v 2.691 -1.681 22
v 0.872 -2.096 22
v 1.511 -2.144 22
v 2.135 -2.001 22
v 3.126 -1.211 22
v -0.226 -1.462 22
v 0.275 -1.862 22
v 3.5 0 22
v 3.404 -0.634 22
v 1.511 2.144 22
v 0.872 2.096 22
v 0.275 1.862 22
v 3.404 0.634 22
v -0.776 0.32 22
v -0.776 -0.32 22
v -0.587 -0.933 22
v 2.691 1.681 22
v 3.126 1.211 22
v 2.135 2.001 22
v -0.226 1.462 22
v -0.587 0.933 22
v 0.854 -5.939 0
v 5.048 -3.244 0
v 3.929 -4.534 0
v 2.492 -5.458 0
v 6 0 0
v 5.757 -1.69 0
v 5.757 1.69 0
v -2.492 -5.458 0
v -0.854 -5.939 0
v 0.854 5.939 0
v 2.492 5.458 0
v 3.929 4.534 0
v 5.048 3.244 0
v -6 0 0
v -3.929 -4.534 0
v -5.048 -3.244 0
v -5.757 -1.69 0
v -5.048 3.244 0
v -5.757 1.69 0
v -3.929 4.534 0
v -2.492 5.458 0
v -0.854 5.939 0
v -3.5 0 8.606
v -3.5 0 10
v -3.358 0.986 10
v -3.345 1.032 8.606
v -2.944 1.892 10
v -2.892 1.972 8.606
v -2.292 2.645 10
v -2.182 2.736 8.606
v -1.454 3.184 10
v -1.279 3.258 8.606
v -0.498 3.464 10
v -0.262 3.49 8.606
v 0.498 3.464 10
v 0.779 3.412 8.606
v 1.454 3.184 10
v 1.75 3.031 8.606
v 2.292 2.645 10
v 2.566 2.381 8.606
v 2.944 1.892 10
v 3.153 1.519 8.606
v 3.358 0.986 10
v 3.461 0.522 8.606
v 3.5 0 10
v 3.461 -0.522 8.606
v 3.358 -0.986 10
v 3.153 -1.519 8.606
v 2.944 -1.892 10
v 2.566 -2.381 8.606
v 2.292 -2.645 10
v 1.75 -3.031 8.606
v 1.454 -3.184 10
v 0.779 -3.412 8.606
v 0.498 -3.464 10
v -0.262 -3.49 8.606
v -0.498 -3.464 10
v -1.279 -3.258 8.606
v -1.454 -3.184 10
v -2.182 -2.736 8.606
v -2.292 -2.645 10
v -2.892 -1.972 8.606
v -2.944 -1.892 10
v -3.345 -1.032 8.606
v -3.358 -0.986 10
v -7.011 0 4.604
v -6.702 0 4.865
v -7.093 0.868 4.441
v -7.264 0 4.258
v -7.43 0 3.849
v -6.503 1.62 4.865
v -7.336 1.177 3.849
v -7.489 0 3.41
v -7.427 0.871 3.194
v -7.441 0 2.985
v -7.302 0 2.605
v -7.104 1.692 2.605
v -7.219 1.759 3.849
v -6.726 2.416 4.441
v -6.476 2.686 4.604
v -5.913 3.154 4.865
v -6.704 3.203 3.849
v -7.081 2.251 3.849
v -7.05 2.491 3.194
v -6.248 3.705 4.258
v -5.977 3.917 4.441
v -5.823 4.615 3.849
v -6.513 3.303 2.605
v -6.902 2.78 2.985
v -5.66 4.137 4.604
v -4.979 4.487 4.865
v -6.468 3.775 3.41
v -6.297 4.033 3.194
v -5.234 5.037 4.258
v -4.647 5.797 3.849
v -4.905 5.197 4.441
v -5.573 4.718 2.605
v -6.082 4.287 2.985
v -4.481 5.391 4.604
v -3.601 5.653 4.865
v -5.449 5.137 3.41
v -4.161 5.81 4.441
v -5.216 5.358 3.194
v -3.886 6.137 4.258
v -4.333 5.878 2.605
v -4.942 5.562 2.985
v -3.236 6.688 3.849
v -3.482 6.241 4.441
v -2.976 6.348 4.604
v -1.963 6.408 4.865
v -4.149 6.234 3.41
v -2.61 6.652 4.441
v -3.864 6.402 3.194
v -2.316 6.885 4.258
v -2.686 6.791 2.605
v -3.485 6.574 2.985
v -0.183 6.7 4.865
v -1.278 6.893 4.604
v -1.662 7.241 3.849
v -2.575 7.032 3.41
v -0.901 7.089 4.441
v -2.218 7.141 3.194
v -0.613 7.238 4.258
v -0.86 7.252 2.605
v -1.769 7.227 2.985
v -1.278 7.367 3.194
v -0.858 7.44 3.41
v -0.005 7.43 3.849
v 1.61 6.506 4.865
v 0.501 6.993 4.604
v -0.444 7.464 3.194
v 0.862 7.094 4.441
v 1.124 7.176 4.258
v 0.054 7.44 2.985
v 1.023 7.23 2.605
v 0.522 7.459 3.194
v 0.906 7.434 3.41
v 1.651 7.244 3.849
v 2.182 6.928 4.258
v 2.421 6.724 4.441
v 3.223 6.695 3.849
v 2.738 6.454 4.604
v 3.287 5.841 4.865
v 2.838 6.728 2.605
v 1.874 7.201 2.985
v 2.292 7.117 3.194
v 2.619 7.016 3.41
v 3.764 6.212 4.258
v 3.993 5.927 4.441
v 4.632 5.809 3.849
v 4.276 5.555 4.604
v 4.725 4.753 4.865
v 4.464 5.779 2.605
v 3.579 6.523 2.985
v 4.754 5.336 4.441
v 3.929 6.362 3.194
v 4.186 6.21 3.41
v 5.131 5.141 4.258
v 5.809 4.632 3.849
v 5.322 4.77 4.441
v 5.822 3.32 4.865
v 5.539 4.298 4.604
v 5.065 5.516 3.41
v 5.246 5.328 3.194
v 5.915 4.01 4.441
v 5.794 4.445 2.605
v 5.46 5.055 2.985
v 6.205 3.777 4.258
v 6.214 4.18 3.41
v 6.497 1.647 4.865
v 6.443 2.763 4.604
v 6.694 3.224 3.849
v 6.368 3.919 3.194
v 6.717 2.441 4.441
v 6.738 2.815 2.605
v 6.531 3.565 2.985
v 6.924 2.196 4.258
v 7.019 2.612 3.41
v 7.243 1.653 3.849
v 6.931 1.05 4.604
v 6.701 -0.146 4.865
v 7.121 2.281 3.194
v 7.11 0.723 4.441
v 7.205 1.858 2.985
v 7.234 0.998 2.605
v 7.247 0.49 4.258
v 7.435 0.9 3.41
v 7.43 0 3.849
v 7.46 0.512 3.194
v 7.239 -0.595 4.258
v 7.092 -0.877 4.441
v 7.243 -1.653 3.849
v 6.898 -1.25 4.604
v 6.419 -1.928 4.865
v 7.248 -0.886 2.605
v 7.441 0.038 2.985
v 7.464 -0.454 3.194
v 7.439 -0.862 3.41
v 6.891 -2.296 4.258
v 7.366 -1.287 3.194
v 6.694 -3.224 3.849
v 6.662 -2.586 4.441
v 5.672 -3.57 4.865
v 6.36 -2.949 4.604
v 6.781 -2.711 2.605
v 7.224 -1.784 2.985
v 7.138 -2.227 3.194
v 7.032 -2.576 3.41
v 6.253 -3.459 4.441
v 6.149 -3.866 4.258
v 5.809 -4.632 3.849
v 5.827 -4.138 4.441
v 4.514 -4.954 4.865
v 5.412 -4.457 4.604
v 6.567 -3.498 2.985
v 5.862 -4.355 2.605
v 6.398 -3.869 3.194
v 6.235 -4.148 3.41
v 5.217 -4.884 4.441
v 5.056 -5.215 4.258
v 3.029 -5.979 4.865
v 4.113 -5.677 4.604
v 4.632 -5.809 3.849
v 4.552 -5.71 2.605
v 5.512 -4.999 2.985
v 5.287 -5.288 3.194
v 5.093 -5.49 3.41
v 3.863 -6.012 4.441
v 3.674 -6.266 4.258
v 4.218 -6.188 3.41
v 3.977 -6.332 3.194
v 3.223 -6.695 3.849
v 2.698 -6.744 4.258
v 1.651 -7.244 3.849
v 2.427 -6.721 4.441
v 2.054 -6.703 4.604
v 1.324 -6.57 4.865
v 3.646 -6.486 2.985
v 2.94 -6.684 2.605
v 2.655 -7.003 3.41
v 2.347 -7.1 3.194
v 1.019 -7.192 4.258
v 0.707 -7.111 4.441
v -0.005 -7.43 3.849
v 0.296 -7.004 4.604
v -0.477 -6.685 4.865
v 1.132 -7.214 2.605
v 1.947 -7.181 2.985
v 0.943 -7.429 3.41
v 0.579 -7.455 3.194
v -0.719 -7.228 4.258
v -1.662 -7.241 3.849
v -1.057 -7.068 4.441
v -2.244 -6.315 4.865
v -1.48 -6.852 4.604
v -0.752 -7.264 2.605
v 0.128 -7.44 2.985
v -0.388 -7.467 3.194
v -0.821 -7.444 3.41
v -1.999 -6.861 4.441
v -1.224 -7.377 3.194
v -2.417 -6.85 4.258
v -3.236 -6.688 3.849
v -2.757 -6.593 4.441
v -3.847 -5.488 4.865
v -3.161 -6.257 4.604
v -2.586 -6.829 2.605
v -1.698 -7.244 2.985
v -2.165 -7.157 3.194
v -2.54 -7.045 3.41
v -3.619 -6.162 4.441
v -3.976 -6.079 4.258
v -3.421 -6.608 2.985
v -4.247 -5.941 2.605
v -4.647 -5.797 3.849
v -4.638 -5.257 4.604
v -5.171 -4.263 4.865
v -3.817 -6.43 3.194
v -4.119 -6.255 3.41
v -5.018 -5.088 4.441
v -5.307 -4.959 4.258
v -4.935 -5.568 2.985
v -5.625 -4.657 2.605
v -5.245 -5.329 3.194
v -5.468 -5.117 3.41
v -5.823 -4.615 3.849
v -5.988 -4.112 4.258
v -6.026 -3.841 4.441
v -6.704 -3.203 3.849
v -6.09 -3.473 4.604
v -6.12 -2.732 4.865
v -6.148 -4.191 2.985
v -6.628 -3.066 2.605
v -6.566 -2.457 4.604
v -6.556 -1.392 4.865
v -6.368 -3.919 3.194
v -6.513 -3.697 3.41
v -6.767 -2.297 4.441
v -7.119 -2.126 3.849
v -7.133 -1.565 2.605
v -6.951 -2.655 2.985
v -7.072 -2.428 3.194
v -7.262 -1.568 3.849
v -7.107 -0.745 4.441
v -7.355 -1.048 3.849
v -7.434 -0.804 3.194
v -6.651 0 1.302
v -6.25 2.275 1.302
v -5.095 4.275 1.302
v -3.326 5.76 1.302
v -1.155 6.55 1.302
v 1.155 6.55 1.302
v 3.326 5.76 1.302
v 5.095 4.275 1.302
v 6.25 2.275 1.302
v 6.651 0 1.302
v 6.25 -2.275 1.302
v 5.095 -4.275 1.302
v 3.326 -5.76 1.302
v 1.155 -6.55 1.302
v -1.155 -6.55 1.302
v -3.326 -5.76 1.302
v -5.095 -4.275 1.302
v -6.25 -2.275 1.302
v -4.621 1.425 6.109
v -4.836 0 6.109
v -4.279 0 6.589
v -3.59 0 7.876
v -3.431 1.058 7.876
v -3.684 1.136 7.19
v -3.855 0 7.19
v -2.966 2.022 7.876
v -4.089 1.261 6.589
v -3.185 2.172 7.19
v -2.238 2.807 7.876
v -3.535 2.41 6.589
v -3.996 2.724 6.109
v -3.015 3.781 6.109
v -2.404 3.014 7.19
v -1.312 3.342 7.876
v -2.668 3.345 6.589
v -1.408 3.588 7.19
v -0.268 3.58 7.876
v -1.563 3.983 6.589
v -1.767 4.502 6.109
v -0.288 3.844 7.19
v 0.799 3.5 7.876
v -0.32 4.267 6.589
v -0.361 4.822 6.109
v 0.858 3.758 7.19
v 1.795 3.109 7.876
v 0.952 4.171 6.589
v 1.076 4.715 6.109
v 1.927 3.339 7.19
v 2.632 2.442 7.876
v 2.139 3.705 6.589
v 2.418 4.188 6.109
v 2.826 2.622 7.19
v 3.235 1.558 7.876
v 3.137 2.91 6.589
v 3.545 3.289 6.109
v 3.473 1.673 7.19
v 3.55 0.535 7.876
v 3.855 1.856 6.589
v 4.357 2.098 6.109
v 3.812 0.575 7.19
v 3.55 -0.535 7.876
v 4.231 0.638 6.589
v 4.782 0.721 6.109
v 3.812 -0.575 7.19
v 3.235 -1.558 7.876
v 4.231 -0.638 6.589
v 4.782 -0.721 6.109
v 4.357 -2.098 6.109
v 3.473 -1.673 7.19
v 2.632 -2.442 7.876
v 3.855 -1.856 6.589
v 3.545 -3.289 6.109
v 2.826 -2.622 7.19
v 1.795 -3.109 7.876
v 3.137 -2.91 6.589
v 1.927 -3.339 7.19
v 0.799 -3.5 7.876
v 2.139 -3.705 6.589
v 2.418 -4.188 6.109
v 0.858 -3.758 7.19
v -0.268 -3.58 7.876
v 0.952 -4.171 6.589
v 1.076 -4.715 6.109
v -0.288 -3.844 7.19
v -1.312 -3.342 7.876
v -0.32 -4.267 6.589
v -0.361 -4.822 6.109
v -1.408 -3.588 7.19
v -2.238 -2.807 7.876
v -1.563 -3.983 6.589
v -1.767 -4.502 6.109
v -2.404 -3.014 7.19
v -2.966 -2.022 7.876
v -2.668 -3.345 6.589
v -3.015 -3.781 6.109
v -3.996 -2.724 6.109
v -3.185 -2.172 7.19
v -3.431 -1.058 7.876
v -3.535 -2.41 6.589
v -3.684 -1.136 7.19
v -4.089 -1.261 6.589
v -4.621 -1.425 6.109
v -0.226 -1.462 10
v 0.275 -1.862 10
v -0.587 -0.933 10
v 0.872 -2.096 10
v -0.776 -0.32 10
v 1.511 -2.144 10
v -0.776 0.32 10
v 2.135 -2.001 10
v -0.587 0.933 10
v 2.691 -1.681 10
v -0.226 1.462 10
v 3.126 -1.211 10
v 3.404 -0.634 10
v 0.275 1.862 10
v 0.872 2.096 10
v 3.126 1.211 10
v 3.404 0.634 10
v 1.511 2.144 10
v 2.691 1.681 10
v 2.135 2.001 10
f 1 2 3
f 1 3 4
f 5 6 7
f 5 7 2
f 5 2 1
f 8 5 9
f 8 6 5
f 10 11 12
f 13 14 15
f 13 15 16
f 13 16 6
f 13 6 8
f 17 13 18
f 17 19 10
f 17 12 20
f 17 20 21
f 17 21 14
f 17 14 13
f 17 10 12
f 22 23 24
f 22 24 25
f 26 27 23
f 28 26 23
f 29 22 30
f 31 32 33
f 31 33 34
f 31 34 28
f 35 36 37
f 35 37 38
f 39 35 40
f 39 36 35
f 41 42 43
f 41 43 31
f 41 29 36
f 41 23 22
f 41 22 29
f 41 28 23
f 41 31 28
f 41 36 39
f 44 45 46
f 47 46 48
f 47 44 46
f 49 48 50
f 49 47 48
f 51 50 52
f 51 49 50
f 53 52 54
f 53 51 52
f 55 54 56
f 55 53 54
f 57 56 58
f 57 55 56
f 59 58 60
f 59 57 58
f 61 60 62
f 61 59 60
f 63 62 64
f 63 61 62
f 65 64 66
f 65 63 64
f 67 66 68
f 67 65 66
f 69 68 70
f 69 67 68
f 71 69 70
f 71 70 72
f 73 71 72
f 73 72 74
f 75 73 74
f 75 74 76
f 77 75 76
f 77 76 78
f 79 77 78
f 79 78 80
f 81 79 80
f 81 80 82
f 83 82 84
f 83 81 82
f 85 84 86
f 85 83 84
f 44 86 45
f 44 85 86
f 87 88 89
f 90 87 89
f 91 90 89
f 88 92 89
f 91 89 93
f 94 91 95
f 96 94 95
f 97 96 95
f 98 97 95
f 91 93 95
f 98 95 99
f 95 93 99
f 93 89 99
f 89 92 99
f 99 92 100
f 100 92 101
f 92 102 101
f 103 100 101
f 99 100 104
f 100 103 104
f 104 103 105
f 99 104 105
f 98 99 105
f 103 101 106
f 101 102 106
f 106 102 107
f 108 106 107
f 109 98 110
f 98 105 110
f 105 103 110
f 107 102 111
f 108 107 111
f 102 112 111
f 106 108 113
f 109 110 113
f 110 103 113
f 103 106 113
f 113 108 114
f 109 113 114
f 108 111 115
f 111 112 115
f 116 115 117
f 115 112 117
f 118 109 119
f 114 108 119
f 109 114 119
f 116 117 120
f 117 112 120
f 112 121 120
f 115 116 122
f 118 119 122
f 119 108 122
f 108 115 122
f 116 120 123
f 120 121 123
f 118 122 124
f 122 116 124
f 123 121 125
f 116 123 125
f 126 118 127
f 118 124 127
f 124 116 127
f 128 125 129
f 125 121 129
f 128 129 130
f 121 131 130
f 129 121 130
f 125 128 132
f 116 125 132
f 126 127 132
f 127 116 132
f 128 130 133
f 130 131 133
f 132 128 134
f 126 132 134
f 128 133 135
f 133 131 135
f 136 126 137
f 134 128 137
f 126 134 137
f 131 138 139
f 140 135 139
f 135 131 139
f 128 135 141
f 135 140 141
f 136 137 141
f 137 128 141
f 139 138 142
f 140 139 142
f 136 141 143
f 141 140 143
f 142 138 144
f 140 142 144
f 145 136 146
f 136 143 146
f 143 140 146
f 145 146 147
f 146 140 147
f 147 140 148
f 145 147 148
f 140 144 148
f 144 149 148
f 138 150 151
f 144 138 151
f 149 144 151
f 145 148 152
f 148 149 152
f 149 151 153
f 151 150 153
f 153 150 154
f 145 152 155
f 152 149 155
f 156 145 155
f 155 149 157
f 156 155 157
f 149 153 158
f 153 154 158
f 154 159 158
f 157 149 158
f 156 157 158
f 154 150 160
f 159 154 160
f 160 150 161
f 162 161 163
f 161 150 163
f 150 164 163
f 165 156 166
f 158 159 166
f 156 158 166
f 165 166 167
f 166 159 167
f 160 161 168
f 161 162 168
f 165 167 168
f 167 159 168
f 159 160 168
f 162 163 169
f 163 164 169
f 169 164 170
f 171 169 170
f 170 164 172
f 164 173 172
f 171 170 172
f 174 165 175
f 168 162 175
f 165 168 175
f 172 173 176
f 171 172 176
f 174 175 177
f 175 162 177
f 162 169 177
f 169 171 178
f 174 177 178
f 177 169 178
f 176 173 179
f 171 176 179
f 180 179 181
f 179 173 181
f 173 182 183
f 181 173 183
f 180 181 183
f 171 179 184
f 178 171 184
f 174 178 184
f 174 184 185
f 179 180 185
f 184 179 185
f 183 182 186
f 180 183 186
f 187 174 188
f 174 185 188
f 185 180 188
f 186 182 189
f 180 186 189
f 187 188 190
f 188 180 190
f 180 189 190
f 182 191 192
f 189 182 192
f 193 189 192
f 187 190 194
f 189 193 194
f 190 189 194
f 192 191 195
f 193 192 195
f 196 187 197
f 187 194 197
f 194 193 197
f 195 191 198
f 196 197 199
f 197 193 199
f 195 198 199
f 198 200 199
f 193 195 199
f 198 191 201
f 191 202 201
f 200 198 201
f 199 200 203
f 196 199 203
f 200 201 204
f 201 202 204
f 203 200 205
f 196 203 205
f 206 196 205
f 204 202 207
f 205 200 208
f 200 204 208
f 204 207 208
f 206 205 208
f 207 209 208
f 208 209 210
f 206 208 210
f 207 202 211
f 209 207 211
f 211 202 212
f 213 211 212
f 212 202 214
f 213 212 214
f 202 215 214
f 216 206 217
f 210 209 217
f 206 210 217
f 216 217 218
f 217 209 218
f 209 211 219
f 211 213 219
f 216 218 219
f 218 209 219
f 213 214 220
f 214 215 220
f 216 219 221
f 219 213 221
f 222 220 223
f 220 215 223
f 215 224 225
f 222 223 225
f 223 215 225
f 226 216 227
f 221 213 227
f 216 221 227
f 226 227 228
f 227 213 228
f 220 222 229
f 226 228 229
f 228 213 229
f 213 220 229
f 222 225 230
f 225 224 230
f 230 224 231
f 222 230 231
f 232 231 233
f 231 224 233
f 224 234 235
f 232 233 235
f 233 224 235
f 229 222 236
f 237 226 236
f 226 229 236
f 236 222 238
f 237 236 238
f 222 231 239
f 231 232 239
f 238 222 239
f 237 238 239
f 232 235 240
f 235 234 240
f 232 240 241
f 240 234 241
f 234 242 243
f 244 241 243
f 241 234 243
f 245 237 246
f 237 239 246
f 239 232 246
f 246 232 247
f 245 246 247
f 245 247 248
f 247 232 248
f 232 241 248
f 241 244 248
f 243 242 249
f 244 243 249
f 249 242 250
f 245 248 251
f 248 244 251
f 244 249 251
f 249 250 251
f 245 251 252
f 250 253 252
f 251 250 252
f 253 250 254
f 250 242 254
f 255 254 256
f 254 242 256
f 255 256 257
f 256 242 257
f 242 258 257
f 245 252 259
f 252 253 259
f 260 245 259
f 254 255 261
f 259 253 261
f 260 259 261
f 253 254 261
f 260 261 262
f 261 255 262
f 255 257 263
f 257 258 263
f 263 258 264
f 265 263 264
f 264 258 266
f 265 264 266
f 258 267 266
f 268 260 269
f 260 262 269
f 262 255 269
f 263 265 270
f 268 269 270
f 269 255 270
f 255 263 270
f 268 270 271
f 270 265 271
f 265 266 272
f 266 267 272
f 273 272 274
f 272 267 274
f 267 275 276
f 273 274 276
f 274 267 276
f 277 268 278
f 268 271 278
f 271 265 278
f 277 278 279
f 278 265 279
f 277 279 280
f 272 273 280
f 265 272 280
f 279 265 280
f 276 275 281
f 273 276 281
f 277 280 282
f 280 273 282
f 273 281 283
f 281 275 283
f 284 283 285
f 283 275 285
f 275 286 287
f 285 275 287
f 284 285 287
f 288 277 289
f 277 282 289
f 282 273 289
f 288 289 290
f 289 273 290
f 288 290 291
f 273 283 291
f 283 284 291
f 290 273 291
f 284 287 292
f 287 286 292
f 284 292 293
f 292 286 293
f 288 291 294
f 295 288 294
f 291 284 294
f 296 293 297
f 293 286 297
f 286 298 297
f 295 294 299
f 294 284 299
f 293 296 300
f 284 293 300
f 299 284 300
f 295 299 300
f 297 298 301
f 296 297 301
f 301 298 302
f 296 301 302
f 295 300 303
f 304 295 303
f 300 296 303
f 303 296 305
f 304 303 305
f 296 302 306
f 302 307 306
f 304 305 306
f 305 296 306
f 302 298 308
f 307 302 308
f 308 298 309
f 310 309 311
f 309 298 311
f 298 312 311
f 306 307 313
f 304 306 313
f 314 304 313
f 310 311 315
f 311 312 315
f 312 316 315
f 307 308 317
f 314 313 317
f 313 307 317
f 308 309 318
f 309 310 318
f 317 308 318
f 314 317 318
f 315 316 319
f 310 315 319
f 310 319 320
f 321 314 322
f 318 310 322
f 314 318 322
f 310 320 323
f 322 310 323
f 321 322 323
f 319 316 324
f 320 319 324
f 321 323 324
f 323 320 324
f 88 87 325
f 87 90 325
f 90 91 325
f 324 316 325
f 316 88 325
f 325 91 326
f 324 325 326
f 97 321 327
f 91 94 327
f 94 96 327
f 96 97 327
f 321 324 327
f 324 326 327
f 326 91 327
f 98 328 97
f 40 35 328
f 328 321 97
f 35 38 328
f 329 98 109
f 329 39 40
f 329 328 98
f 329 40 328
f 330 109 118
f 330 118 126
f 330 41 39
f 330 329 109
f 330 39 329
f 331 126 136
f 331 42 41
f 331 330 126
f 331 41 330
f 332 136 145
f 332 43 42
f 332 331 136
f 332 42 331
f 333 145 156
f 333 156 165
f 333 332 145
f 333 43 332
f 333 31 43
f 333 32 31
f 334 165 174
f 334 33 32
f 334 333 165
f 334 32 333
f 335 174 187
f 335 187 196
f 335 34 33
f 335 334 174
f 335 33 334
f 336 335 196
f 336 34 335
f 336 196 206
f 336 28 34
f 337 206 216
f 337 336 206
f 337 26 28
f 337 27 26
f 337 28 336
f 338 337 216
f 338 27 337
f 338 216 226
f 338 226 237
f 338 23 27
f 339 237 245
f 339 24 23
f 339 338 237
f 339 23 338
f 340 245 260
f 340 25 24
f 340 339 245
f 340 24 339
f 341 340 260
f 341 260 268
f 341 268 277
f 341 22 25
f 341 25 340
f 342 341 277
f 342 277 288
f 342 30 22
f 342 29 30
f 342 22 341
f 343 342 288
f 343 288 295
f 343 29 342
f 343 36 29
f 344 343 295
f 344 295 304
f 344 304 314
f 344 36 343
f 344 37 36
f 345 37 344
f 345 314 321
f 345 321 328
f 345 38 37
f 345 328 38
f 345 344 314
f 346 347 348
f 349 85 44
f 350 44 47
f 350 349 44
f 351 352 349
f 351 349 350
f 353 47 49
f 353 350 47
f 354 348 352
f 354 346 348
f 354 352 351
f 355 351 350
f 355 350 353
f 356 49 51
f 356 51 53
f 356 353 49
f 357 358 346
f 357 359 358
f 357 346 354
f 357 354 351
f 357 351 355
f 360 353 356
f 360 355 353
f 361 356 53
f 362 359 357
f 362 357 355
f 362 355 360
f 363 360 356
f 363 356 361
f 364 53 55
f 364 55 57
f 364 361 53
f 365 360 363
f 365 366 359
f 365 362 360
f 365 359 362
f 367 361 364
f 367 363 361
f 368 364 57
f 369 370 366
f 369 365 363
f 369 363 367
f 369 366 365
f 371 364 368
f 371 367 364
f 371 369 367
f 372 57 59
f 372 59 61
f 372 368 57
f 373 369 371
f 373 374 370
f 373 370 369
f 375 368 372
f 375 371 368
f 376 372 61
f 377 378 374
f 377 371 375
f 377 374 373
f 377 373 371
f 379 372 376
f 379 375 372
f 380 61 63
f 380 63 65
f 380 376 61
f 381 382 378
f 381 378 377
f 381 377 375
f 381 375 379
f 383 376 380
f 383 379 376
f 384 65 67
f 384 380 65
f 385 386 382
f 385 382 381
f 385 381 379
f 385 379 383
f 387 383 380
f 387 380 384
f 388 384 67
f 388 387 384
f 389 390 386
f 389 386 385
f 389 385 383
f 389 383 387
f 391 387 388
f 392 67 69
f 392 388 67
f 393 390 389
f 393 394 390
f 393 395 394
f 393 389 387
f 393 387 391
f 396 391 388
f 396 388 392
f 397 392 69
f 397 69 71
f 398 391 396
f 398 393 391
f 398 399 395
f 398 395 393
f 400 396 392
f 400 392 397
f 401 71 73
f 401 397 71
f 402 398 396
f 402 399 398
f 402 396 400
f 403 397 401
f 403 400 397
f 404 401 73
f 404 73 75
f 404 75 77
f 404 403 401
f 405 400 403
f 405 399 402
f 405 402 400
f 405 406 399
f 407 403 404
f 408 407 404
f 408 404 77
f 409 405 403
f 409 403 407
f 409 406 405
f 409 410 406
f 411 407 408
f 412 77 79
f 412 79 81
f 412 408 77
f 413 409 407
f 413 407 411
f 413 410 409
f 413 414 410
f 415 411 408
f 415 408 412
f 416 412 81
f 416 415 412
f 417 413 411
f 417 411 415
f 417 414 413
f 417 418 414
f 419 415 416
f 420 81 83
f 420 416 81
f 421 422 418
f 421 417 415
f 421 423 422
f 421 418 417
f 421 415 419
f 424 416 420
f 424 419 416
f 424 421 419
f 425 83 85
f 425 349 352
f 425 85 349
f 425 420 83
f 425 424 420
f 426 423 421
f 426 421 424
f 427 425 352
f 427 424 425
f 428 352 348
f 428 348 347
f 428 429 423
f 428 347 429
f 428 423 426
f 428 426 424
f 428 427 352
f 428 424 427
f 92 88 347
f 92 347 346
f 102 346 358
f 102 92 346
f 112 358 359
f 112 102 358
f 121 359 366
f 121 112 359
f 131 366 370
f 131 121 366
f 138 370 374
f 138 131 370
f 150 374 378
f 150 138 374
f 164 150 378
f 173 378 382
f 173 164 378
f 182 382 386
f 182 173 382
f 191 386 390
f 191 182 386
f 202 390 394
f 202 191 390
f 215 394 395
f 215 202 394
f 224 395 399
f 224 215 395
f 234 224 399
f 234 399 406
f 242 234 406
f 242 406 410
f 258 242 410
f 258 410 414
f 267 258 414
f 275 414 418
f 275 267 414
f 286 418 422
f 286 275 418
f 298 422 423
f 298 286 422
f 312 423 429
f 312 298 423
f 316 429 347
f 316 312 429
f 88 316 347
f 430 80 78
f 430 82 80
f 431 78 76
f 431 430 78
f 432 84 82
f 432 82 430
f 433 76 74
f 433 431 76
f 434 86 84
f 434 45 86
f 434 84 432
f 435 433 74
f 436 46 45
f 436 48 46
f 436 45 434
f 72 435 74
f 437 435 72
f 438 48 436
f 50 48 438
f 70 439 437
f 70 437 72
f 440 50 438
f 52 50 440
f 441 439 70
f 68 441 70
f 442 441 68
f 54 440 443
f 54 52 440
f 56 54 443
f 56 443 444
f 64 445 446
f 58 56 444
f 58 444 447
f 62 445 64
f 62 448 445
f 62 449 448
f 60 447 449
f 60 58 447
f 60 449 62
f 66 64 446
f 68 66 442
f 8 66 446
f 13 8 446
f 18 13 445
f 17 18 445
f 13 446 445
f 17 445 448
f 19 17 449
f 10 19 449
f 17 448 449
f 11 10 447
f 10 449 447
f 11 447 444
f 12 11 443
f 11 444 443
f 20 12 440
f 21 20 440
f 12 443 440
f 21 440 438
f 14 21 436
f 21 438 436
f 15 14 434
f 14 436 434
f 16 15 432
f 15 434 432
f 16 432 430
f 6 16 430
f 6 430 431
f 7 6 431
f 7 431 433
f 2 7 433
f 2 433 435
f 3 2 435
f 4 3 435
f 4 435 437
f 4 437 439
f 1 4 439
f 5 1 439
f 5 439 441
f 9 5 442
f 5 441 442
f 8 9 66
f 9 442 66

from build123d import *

# Parameters (mm, degrees)
F2_R     = 1.766966
F3_R     = 2.15
F4_DEPTH = 12


with BuildPart() as f1:
    # F0 (on Front) → F1 (revolve)
    with BuildSketch(Plane.XZ):
        with BuildLine():
            Line((-6, 0), (0, 0))
            Line((0, 0), (0, 10))
            Line((0, 10), (-3.5, 10))
            Line((-3.5, 10), (-3.5, 8.605551))
            ThreePointArc((-3.5, 8.605551), (-3.854976, 7.189977), (-4.835899, 6.1094))
            Line((-4.835899, 6.1094), (-8, 4))
            Line((-8, 4), (-6, 0))
        make_face()
    revolve(axis=Axis((0, 0, 5), (0, 0, -1)))

    # F2
    f2_edges = [f1.edges().sort_by_distance(p)[0] for p in [
        (8, 0, 4),
    ]]
    fillet(f2_edges, radius=F2_R)

    # F3 (on face) → F4 (join)
    with BuildSketch(Plane.XY.offset(10)):
        with Locations((1.35, 0)):
            Circle(F3_R)
    extrude(amount=F4_DEPTH)


solid = f1.part
